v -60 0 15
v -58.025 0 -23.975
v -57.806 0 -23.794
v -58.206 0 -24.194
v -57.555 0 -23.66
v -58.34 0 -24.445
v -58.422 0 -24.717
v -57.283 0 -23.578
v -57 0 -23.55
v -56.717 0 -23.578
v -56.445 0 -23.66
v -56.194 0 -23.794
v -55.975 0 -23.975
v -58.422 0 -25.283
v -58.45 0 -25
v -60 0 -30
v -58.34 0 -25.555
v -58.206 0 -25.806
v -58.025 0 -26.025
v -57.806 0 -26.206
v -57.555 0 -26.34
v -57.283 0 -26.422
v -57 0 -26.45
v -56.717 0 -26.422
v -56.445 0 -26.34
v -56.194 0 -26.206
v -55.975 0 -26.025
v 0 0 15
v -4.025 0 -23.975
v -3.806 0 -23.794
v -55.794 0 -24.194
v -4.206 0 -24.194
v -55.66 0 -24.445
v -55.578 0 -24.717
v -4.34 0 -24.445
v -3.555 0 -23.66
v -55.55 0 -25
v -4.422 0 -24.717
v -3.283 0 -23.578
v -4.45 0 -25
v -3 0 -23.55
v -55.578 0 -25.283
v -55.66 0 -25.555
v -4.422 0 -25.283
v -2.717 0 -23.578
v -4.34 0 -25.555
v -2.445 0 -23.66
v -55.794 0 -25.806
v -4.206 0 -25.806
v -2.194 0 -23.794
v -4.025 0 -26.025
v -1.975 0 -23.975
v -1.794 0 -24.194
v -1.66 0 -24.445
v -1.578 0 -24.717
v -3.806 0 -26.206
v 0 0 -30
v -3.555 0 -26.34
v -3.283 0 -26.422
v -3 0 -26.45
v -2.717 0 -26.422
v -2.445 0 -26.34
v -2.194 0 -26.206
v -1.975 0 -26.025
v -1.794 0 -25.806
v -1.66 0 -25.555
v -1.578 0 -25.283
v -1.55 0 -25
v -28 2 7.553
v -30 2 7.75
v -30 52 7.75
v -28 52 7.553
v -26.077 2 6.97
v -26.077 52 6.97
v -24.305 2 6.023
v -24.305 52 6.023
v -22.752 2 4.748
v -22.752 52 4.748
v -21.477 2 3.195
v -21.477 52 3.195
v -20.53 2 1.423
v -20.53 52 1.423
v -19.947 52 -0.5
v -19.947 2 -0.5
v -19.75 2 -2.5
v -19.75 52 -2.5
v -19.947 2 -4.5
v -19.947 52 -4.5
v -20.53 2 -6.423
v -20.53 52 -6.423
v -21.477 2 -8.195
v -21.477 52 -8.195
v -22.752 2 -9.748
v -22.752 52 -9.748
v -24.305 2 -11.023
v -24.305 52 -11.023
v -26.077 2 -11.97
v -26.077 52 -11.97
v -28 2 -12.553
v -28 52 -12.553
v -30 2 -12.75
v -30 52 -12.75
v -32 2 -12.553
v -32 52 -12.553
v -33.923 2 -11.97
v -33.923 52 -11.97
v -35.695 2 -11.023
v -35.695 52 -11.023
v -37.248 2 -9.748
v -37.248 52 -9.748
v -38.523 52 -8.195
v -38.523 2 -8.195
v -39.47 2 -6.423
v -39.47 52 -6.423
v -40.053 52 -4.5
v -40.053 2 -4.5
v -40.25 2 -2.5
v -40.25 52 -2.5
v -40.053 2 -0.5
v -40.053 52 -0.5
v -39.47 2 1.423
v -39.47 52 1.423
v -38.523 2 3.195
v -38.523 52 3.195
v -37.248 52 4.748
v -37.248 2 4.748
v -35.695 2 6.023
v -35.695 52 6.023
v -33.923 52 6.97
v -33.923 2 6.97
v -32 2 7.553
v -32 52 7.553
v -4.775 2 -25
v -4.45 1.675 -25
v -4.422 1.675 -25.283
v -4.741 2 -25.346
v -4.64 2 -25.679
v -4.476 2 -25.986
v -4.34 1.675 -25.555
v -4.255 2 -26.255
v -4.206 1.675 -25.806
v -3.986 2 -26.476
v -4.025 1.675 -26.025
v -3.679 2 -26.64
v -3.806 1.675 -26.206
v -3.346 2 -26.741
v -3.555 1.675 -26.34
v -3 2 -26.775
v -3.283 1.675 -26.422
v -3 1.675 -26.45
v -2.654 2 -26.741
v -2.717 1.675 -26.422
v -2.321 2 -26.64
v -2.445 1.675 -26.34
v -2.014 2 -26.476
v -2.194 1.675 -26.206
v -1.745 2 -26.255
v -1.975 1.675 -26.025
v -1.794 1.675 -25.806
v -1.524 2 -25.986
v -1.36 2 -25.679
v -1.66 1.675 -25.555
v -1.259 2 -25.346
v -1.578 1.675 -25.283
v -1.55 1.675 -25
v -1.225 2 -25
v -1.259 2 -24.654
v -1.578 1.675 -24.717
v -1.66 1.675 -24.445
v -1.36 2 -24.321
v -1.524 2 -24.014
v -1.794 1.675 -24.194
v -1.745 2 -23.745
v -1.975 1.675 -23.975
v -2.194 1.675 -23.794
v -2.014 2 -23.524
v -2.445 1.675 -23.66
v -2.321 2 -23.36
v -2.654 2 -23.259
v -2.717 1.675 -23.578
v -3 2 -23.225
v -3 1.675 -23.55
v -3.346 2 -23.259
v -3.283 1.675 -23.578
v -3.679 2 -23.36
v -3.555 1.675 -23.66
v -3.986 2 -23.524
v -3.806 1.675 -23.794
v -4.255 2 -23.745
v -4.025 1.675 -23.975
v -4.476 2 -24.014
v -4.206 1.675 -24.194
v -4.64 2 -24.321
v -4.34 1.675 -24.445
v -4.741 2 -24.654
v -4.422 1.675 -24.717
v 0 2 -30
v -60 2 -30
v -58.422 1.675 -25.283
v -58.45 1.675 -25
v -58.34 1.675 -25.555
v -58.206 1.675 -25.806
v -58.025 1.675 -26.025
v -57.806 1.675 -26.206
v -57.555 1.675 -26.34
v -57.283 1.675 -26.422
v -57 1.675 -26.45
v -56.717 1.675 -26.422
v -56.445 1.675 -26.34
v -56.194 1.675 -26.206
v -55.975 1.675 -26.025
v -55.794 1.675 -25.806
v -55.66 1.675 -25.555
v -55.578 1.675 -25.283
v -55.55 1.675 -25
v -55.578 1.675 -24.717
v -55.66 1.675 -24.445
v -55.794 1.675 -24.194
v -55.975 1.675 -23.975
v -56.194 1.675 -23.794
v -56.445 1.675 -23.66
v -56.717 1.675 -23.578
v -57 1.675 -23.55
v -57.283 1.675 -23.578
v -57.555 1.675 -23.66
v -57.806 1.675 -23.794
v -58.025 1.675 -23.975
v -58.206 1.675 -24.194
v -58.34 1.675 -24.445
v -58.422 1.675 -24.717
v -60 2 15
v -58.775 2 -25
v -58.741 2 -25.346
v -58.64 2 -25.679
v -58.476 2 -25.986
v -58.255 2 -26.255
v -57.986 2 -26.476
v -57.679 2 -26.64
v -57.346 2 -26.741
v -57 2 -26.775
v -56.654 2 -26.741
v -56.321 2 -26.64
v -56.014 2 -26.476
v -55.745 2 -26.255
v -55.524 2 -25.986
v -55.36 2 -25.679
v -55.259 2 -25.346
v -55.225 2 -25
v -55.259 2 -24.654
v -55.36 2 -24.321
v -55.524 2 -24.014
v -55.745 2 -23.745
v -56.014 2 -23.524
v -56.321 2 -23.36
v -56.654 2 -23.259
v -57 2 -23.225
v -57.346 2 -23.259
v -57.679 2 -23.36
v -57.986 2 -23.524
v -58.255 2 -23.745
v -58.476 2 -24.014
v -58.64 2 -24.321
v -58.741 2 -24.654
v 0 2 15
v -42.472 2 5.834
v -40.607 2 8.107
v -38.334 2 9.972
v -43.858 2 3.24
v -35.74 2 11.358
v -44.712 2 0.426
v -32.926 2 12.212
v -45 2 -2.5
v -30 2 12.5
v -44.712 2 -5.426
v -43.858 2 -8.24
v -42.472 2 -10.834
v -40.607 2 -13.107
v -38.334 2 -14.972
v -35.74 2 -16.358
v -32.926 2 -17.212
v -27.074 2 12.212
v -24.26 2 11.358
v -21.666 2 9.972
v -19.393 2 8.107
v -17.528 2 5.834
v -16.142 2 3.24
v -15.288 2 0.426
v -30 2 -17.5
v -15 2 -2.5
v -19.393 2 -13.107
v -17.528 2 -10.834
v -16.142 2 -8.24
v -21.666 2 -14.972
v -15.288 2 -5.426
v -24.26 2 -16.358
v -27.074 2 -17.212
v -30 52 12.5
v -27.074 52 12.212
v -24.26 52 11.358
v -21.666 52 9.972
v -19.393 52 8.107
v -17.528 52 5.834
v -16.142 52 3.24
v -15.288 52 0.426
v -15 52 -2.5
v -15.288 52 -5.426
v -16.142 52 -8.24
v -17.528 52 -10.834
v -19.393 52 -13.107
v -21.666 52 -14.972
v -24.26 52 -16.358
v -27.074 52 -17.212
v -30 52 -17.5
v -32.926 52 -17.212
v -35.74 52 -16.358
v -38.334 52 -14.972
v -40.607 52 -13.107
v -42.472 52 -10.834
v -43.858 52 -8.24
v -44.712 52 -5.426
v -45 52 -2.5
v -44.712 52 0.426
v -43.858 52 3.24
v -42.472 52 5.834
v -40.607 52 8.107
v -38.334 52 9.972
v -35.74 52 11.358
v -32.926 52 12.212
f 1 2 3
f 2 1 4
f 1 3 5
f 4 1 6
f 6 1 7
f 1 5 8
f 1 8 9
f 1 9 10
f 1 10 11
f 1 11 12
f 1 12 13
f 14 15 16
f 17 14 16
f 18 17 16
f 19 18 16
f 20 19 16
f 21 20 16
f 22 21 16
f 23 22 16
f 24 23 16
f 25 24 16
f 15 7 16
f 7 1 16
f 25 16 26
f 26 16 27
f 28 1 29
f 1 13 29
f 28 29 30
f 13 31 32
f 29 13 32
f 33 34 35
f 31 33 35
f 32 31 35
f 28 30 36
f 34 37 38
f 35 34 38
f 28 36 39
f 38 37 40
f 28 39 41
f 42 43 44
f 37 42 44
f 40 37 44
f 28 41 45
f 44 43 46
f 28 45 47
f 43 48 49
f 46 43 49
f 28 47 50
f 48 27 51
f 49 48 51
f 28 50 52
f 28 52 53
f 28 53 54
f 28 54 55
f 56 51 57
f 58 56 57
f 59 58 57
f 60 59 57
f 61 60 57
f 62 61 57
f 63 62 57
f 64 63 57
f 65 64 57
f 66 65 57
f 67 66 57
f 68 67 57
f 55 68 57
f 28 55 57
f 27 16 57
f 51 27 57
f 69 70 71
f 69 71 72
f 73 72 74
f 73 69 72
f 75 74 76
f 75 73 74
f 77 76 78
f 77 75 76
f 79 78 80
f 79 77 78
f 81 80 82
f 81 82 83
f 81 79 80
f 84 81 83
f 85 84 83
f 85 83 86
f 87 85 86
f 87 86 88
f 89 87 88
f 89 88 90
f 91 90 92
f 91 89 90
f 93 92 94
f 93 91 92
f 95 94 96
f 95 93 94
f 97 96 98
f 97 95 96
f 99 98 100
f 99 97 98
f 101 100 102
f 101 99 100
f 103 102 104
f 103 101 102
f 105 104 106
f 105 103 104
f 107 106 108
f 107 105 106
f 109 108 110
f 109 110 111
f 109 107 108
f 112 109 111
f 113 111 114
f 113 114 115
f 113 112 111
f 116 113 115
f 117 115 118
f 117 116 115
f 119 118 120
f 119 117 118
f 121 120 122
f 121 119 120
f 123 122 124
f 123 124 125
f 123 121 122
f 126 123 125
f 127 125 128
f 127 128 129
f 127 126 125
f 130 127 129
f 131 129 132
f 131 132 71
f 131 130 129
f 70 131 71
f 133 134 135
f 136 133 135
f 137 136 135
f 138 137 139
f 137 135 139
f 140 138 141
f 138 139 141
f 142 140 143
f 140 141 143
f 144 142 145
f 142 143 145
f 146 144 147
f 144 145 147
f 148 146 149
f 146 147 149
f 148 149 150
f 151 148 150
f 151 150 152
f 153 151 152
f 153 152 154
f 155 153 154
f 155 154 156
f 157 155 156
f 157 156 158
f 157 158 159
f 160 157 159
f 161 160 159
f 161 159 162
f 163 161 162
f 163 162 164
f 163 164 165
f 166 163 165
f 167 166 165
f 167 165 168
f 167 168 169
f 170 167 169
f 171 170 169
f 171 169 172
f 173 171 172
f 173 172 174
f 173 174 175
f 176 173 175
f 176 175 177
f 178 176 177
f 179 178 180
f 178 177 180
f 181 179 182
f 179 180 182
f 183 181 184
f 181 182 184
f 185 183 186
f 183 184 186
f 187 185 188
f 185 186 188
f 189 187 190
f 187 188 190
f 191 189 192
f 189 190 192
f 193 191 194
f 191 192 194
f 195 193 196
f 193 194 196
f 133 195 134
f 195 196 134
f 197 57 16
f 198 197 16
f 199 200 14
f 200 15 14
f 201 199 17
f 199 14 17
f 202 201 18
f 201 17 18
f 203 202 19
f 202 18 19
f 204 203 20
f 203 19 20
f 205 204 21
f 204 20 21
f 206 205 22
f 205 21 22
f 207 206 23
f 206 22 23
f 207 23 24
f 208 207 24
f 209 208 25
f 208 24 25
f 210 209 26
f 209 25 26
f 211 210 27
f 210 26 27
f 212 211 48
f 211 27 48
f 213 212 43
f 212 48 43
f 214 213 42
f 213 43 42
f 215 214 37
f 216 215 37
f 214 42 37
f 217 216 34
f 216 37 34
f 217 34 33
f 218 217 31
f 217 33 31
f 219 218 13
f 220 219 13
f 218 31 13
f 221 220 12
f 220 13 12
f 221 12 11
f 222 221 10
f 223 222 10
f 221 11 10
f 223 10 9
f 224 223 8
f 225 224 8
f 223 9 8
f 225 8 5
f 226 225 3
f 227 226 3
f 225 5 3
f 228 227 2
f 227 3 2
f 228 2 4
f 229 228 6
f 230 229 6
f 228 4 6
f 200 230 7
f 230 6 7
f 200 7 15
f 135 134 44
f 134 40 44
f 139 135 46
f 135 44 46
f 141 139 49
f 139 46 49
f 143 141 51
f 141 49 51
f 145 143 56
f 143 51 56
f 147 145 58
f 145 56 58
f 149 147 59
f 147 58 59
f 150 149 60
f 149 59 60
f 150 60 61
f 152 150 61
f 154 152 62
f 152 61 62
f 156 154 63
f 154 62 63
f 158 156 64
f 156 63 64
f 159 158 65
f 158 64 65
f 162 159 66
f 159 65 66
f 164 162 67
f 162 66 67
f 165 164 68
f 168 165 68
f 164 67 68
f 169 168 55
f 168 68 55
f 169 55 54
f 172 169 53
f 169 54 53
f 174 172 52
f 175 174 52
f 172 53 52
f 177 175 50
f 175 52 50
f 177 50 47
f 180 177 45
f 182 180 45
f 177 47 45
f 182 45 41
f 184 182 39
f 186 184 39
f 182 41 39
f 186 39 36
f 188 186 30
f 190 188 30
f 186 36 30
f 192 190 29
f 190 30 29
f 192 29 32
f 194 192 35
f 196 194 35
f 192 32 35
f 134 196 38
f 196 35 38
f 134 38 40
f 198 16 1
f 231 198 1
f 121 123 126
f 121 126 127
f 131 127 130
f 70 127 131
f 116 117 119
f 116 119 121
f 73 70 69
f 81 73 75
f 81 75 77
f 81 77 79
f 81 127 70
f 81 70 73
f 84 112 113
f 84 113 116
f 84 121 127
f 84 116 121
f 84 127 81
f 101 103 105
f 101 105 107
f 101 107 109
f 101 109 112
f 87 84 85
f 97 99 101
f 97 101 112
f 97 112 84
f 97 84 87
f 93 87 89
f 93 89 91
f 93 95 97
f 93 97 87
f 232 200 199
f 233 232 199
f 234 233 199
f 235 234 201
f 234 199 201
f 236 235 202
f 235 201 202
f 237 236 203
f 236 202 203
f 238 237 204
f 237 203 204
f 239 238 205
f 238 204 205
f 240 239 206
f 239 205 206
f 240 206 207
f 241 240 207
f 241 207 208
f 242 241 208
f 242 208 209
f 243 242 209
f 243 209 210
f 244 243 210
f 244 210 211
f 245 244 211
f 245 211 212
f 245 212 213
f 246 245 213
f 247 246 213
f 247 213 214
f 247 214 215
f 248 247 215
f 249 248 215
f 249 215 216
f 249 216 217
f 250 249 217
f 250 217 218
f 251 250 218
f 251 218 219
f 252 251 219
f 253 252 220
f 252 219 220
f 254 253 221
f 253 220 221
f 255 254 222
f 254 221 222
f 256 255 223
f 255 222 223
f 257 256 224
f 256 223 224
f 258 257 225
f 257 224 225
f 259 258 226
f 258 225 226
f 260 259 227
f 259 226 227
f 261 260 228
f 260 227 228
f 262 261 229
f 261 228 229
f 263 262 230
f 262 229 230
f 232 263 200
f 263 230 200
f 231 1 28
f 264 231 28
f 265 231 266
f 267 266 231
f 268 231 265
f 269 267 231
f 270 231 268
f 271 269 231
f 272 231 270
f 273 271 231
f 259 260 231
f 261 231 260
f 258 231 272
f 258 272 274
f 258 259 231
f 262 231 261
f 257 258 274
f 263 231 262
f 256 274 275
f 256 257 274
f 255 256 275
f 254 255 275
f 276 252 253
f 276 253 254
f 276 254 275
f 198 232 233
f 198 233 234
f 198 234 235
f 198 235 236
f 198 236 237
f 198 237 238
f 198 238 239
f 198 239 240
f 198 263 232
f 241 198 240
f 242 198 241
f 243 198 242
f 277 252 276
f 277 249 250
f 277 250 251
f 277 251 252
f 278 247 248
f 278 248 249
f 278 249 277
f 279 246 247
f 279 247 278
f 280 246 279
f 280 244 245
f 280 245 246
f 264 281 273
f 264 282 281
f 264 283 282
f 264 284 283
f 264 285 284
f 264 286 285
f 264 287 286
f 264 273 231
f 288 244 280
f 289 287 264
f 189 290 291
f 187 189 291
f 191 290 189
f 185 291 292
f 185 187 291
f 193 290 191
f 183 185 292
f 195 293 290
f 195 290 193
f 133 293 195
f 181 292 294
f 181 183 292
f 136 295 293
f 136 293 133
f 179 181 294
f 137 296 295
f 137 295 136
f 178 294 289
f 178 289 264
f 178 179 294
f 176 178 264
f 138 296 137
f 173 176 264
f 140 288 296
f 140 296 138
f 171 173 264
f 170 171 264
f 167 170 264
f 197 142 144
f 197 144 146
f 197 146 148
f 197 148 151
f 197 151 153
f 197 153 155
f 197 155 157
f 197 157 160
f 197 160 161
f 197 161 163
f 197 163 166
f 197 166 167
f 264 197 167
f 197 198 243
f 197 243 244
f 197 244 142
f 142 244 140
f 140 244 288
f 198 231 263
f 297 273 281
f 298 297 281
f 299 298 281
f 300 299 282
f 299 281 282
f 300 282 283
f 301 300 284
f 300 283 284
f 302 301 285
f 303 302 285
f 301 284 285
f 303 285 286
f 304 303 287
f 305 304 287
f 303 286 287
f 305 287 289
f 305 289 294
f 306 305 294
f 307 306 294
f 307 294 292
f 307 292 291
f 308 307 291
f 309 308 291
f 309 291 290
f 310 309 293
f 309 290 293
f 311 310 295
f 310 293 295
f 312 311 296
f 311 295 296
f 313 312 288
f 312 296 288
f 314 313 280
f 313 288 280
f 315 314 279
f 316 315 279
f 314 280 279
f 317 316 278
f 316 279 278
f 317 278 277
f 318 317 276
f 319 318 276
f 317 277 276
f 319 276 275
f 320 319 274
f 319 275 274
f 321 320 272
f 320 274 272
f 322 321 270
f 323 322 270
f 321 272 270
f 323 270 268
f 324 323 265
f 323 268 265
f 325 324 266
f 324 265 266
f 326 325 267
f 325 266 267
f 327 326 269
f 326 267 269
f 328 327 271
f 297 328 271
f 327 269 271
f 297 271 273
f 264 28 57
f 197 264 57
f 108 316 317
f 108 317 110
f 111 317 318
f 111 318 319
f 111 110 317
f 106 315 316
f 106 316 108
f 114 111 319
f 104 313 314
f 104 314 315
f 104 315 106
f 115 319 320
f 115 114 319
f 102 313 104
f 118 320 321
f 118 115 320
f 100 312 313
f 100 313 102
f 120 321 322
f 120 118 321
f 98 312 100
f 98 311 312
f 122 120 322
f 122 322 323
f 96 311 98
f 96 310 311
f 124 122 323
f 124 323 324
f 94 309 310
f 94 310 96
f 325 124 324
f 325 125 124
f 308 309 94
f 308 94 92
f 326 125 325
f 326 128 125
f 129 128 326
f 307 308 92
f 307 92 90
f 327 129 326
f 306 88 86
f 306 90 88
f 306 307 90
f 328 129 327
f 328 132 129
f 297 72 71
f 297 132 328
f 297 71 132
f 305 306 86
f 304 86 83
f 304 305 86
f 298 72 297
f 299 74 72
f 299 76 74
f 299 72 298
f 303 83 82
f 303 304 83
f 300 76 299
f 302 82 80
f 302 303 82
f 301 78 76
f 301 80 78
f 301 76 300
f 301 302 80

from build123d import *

# Parameters (mm, degrees)
EXTRUDE_1_DEPTH                = 2
HOLE_WIZARD_M3_5_1_D           = 2.9
HOLE_WIZARD_M3_5_1_DEPTH       = 8.8
HOLE_WIZARD_M3_5_1_CSINK_D     = 3.55
HOLE_WIZARD_M3_5_1_CSINK_ANGLE = 90
HOLE_WIZARD_M3_5_1_TIP         = 0.871247898
SKETCH_4_R                     = 15
SKETCH_4_R_2                   = 10.25
EXTRUDE_2_DEPTH                = 50


with BuildPart() as part:
    # 草图1 → 凸台-拉伸1 (new body)
    with BuildSketch(Plane(origin=(0, 0, 0), x_dir=(1, 0, 0), z_dir=(0, 1, 0))):
        Polygon((0, -15), (0, 0), (0, 30), (-30, 30), (-57, 30), (-60, 30), (-60, 0), (-60, -15), align=None)
    extrude(amount=EXTRUDE_1_DEPTH)

    # M3.5 螺纹孔1
    with Locations(Plane(origin=(0, 2, 0), x_dir=(1, 0, 0), z_dir=(0, 1, 0))):
        with Locations((-57, 25), (-3, 25)):
            CounterSinkHole(HOLE_WIZARD_M3_5_1_D / 2, HOLE_WIZARD_M3_5_1_CSINK_D / 2, depth=HOLE_WIZARD_M3_5_1_DEPTH, counter_sink_angle=HOLE_WIZARD_M3_5_1_CSINK_ANGLE)
            with Locations((0, 0, -(HOLE_WIZARD_M3_5_1_DEPTH + HOLE_WIZARD_M3_5_1_TIP / 2))):  # 118° drill point
                Cone(0, HOLE_WIZARD_M3_5_1_D / 2, HOLE_WIZARD_M3_5_1_TIP, mode=Mode.SUBTRACT)

    # 草图4 → 凸台-拉伸2 (add)
    with BuildSketch(Plane(origin=(0, 2, 0), x_dir=(1, 0, 0), z_dir=(0, 1, 0))):
        with Locations(Location((-30, 2.5, 0), (0, 0, 270))):
            Circle(SKETCH_4_R)
        with Locations(Location((-30, 2.5, 0), (0, 0, 270))):
            Circle(SKETCH_4_R_2, mode=Mode.SUBTRACT)
    extrude(amount=EXTRUDE_2_DEPTH)


solid = part.part
